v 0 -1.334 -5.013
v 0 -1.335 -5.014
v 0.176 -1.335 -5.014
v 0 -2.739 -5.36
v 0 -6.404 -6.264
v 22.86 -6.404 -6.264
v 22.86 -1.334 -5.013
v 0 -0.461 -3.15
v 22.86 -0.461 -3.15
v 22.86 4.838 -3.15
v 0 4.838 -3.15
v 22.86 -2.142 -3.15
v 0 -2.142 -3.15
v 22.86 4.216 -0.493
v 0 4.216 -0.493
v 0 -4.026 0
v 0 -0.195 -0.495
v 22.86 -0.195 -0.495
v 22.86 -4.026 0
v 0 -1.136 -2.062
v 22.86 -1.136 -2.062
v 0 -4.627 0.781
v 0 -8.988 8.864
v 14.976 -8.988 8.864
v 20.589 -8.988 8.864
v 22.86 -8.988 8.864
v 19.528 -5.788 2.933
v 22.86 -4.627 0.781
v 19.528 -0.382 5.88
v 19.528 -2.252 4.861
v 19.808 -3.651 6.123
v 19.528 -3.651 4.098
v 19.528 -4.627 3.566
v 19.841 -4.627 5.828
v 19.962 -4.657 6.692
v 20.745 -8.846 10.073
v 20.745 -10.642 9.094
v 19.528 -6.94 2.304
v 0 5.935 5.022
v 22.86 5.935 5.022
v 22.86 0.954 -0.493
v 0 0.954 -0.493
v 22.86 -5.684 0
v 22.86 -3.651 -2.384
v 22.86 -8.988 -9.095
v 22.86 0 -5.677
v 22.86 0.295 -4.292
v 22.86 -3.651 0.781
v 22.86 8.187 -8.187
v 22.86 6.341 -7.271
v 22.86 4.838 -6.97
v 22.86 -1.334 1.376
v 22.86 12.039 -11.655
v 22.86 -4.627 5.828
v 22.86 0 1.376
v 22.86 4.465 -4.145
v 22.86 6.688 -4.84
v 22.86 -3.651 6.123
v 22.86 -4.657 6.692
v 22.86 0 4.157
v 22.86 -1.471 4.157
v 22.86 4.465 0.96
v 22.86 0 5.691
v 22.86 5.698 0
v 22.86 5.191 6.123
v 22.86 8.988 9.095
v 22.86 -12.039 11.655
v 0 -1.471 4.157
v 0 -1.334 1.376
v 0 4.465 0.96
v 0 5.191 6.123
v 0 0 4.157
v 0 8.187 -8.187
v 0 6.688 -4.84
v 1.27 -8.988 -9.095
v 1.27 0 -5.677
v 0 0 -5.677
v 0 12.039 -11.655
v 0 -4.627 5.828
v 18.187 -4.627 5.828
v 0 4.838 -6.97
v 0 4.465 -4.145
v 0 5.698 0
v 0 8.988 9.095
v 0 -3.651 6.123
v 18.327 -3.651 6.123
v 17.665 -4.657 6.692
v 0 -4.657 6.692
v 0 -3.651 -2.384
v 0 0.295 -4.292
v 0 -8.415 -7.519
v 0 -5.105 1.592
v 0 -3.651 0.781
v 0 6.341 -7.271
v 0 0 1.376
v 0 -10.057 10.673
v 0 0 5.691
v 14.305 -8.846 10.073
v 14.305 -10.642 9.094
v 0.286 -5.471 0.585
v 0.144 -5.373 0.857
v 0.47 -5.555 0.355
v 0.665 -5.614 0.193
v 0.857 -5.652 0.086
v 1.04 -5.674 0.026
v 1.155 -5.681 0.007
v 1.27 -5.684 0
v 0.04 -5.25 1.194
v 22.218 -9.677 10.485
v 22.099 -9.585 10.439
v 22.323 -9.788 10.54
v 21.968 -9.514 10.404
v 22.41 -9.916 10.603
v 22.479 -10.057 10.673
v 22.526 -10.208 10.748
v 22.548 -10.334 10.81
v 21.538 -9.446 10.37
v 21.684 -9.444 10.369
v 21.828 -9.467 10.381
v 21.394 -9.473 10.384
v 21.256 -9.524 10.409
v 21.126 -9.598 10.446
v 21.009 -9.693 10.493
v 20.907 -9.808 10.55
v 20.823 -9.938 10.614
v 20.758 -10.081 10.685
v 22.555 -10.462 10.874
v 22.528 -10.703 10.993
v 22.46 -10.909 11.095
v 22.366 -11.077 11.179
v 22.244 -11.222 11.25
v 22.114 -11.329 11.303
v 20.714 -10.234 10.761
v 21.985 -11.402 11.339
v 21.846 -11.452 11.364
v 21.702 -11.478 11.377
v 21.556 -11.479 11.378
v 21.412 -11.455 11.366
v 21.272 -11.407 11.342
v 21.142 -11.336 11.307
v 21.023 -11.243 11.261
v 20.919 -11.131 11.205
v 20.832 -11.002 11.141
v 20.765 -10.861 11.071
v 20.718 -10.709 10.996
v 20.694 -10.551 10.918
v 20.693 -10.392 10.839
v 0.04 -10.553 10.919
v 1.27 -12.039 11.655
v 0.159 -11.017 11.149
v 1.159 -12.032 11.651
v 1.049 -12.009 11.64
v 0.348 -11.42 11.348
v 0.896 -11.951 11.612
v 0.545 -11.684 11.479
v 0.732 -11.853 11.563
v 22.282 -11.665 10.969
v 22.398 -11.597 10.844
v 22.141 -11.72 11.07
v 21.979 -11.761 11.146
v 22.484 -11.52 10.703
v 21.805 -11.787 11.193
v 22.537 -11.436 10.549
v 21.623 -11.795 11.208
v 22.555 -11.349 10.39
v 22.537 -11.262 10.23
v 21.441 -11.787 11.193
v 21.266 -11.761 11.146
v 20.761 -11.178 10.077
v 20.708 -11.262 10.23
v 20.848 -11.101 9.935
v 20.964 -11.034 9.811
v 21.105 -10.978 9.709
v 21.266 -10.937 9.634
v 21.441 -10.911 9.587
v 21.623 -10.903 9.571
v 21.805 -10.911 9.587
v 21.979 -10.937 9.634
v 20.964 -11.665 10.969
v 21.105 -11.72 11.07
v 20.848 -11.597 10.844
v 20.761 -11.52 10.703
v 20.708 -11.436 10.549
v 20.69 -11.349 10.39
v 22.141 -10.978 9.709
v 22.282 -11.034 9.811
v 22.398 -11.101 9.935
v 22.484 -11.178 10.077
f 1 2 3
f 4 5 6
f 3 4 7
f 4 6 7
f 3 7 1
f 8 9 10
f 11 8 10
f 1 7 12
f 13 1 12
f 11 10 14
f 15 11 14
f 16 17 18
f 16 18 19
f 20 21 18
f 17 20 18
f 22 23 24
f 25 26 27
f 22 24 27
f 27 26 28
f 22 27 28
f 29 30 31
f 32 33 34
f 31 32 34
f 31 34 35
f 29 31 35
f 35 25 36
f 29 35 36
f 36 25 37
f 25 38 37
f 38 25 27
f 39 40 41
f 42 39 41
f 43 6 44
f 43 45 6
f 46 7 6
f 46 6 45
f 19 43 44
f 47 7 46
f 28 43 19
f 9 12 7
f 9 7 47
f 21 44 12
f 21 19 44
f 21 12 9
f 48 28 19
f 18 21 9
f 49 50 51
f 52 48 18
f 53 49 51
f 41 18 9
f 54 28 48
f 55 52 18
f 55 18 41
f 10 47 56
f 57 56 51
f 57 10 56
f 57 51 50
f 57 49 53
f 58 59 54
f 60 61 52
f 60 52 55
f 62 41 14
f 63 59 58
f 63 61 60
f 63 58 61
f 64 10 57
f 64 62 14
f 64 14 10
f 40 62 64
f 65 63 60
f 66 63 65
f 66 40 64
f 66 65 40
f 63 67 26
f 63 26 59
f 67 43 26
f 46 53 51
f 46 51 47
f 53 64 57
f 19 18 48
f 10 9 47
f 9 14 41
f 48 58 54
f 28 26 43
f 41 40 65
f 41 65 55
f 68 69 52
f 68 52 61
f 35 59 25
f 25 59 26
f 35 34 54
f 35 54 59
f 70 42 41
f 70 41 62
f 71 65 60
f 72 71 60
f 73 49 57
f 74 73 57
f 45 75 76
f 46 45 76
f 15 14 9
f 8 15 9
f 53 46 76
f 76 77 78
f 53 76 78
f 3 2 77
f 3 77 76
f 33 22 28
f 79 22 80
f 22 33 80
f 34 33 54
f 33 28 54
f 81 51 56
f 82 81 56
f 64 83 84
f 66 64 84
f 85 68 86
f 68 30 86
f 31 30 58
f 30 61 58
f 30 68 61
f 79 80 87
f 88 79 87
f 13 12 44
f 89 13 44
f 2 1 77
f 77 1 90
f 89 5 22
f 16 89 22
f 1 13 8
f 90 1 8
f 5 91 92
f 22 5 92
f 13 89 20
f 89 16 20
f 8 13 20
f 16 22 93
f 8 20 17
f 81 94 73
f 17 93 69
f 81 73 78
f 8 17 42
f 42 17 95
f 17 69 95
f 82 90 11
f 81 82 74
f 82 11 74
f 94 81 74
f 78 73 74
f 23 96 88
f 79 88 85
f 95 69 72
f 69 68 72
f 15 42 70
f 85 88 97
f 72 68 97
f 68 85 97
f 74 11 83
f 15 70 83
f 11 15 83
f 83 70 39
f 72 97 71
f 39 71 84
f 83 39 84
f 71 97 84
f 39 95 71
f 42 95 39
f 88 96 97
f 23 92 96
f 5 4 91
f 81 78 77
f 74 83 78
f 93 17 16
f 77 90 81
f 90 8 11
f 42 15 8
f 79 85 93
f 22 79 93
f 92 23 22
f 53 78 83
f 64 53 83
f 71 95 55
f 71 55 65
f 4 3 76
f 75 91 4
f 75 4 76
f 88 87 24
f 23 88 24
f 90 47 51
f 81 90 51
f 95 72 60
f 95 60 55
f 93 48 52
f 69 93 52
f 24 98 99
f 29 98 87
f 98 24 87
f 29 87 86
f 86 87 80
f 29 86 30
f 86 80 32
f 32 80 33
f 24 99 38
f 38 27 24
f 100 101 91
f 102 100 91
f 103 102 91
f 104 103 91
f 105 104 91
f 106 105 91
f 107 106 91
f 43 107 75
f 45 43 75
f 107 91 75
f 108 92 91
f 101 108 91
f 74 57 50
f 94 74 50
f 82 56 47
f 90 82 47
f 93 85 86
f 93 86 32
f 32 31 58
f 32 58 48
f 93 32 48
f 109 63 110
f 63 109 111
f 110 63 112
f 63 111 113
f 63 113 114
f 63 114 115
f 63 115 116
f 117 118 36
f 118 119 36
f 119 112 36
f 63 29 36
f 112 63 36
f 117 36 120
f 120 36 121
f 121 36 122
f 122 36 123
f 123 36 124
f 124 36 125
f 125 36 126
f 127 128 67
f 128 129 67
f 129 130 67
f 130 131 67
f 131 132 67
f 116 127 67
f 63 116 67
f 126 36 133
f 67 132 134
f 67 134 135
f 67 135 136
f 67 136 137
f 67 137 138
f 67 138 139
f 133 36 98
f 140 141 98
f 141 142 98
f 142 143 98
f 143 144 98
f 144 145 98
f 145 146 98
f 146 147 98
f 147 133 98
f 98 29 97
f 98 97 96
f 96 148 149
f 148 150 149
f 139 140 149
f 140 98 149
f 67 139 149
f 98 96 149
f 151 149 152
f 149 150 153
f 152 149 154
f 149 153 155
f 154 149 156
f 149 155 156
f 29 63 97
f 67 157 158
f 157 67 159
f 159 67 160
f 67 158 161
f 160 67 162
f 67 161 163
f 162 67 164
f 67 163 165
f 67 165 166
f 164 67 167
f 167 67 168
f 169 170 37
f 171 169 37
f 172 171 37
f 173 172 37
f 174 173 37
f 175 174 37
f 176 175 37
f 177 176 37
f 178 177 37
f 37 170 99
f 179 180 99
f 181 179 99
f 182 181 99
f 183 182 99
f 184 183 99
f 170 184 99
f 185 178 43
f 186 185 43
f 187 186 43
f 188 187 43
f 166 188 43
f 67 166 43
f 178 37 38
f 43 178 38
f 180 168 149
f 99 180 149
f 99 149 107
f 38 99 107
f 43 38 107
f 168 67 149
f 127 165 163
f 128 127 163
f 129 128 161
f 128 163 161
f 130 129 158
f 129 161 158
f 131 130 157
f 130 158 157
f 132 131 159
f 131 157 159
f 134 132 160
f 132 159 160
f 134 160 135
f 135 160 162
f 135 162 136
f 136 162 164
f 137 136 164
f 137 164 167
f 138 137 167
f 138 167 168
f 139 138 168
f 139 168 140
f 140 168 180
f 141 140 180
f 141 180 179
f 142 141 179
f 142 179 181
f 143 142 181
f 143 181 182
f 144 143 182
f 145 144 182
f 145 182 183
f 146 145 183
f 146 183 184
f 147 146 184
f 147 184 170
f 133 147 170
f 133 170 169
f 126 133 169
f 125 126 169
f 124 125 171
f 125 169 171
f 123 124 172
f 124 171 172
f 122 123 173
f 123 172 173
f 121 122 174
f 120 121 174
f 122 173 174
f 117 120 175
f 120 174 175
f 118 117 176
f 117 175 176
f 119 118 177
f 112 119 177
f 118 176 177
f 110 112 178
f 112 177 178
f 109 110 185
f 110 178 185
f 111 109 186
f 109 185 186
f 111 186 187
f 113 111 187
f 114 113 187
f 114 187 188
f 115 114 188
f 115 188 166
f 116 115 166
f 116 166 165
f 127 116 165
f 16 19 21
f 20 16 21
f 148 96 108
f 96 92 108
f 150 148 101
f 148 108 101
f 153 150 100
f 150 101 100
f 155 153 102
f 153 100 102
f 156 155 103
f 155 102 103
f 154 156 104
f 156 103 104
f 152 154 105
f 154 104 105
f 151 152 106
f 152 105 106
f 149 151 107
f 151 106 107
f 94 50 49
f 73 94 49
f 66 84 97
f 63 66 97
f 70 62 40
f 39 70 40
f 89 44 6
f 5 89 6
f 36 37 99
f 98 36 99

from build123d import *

# Parameters (mm, degrees)
F1_DEPTH    = 22.86
F3_DEPTH    = 22.861
F5_DEPTH    = 21.1407149532
F6_R        = 0.9322227143
F7_DEPTH    = 21.1407149532
F8_R        = 1.27
F9_T4_DEPTH = 16.1477728221


# Not quite as in the source:
# - a fillet or chamfer that OpenCascade refuses, or shapes differently, is made with other operations: its cross-section is extruded or revolved along the edge and cut away or added
# - a feature names something its author has since deleted; it is built from what else it names


with BuildPart() as f1:
    # F0 (on Right) → F1 (new body)
    with BuildSketch(Plane.YZ):
        Polygon((0, 5.6908354163), (-12.0390886441, 11.6551341489), (-5.6838279371, 0), (-8.9875673875, -9.0952031314), (0, -5.6768290866), (12.0390886441, -11.6551341489), (5.6978515349, 0), (8.9875673875, 9.0952031314), align=None)
    extrude(amount=F1_DEPTH)

    # F2 (on face) → F3 (cut, through all)
    with BuildSketch(Plane.YZ.offset(22.86)):
        Polygon((0.2947798819, -4.2920547475), (4.8379492509, -6.9700027277), (4.4653764926, -4.1452315636), align=None)
        Polygon((-0.460864554, -3.1500807424), (4.8379492509, -3.1500807424), (4.2156420195, -0.4934913878), align=None)
        Polygon((-6.4040375873, -6.2635522336), (-1.3339594007, -5.0133955665), (-2.1420896955, -3.1500807424), (-3.6510264616, -2.3839071877), align=None)
        Polygon((-3.6510264616, 0.7806772021), (-1.3339594007, 1.3762915041), (-1.4712439905, 4.1567722153), (-3.6510264616, 6.1231630373), align=None)
        Polygon((-8.9875673875, 8.8637409893), (-4.6268783625, 0.7806772021), (-4.6268783625, 5.8275670744), (-4.6572963607, 6.6916077305), align=None)
        Polygon((0.9543706066, -0.4934913878), (4.4653764926, 0.9595727897), (5.9346228684, 5.0216543911), align=None)
        Polygon((0, 1.3762915041), (5.1912929219, 6.1231630373), (0, 4.1567722153), align=None)
        Polygon((-0.1954076109, -0.4954853684), (-4.0261200629, 0), (-1.1355356546, -2.0616382826), align=None)
        Polygon((8.1868149158, -8.1874002878), (6.6878763027, -4.839763511), (6.3406112604, -7.2706225328), align=None)
    extrude(amount=-F3_DEPTH, mode=Mode.SUBTRACT)

    # F4 (on face) → F5 (cut, through all)
    with BuildSketch(Plane(origin=(0, -4.381188718, -2.3889554726), x_dir=(1, 0, 0), z_dir=(0, -0.8779615957, -0.4787310691))):
        Polygon((20.7448676229, 13.0785638466), (14.3051566556, 13.0785638466), (19.5283554494, 5.3454530425), align=None)
    extrude(amount=-F5_DEPTH, mode=Mode.SUBTRACT)

    # F6 (on face) → F7 (cut, through all)
    with BuildSketch(Plane(origin=(0, -4.381188718, -2.3889554726), x_dir=(1, 0, 0), z_dir=(0, -0.8779615957, -0.4787310691))):
        with Locations((21.6227080673, 14.5550044253)):
            Circle(F6_R)
    extrude(amount=-F7_DEPTH, mode=Mode.SUBTRACT)

    # F8
    f8_edges = [f1.edges().sort_by_distance(p)[0] for p in [
        (0, -8.861458, 5.827567),
    ]]
    fillet(f8_edges, radius=F8_R)

    # F9: chamfer of 1.27 on 1 edges, made by hand


with BuildPart() as f9_tool2:
    # F9_s3 → F9_t4 (new body)
    with BuildSketch(Plane(origin=(0, -13.9265349188, -5.2968844013), x_dir=(1, 0, 0), z_dir=(0, 0.9346765421, 0.355499313))):
        Polygon((0, 4.035998981), (1.27, 5.305998981), (0, 5.305998981), align=None)
    extrude(amount=F9_T4_DEPTH)

    split(bisect_by=Plane(origin=(0, -2.2613507756, -4.553899836), x_dir=(1, 0, 0), z_dir=(0, -0.4447575076, -0.8956510255)), keep=Keep.TOP)


with BuildPart() as f1_1:
    add(f1.part)

    # F9_t1: cut F9_tool2
    add(f9_tool2.part, mode=Mode.SUBTRACT)


solid = f1_1.part
